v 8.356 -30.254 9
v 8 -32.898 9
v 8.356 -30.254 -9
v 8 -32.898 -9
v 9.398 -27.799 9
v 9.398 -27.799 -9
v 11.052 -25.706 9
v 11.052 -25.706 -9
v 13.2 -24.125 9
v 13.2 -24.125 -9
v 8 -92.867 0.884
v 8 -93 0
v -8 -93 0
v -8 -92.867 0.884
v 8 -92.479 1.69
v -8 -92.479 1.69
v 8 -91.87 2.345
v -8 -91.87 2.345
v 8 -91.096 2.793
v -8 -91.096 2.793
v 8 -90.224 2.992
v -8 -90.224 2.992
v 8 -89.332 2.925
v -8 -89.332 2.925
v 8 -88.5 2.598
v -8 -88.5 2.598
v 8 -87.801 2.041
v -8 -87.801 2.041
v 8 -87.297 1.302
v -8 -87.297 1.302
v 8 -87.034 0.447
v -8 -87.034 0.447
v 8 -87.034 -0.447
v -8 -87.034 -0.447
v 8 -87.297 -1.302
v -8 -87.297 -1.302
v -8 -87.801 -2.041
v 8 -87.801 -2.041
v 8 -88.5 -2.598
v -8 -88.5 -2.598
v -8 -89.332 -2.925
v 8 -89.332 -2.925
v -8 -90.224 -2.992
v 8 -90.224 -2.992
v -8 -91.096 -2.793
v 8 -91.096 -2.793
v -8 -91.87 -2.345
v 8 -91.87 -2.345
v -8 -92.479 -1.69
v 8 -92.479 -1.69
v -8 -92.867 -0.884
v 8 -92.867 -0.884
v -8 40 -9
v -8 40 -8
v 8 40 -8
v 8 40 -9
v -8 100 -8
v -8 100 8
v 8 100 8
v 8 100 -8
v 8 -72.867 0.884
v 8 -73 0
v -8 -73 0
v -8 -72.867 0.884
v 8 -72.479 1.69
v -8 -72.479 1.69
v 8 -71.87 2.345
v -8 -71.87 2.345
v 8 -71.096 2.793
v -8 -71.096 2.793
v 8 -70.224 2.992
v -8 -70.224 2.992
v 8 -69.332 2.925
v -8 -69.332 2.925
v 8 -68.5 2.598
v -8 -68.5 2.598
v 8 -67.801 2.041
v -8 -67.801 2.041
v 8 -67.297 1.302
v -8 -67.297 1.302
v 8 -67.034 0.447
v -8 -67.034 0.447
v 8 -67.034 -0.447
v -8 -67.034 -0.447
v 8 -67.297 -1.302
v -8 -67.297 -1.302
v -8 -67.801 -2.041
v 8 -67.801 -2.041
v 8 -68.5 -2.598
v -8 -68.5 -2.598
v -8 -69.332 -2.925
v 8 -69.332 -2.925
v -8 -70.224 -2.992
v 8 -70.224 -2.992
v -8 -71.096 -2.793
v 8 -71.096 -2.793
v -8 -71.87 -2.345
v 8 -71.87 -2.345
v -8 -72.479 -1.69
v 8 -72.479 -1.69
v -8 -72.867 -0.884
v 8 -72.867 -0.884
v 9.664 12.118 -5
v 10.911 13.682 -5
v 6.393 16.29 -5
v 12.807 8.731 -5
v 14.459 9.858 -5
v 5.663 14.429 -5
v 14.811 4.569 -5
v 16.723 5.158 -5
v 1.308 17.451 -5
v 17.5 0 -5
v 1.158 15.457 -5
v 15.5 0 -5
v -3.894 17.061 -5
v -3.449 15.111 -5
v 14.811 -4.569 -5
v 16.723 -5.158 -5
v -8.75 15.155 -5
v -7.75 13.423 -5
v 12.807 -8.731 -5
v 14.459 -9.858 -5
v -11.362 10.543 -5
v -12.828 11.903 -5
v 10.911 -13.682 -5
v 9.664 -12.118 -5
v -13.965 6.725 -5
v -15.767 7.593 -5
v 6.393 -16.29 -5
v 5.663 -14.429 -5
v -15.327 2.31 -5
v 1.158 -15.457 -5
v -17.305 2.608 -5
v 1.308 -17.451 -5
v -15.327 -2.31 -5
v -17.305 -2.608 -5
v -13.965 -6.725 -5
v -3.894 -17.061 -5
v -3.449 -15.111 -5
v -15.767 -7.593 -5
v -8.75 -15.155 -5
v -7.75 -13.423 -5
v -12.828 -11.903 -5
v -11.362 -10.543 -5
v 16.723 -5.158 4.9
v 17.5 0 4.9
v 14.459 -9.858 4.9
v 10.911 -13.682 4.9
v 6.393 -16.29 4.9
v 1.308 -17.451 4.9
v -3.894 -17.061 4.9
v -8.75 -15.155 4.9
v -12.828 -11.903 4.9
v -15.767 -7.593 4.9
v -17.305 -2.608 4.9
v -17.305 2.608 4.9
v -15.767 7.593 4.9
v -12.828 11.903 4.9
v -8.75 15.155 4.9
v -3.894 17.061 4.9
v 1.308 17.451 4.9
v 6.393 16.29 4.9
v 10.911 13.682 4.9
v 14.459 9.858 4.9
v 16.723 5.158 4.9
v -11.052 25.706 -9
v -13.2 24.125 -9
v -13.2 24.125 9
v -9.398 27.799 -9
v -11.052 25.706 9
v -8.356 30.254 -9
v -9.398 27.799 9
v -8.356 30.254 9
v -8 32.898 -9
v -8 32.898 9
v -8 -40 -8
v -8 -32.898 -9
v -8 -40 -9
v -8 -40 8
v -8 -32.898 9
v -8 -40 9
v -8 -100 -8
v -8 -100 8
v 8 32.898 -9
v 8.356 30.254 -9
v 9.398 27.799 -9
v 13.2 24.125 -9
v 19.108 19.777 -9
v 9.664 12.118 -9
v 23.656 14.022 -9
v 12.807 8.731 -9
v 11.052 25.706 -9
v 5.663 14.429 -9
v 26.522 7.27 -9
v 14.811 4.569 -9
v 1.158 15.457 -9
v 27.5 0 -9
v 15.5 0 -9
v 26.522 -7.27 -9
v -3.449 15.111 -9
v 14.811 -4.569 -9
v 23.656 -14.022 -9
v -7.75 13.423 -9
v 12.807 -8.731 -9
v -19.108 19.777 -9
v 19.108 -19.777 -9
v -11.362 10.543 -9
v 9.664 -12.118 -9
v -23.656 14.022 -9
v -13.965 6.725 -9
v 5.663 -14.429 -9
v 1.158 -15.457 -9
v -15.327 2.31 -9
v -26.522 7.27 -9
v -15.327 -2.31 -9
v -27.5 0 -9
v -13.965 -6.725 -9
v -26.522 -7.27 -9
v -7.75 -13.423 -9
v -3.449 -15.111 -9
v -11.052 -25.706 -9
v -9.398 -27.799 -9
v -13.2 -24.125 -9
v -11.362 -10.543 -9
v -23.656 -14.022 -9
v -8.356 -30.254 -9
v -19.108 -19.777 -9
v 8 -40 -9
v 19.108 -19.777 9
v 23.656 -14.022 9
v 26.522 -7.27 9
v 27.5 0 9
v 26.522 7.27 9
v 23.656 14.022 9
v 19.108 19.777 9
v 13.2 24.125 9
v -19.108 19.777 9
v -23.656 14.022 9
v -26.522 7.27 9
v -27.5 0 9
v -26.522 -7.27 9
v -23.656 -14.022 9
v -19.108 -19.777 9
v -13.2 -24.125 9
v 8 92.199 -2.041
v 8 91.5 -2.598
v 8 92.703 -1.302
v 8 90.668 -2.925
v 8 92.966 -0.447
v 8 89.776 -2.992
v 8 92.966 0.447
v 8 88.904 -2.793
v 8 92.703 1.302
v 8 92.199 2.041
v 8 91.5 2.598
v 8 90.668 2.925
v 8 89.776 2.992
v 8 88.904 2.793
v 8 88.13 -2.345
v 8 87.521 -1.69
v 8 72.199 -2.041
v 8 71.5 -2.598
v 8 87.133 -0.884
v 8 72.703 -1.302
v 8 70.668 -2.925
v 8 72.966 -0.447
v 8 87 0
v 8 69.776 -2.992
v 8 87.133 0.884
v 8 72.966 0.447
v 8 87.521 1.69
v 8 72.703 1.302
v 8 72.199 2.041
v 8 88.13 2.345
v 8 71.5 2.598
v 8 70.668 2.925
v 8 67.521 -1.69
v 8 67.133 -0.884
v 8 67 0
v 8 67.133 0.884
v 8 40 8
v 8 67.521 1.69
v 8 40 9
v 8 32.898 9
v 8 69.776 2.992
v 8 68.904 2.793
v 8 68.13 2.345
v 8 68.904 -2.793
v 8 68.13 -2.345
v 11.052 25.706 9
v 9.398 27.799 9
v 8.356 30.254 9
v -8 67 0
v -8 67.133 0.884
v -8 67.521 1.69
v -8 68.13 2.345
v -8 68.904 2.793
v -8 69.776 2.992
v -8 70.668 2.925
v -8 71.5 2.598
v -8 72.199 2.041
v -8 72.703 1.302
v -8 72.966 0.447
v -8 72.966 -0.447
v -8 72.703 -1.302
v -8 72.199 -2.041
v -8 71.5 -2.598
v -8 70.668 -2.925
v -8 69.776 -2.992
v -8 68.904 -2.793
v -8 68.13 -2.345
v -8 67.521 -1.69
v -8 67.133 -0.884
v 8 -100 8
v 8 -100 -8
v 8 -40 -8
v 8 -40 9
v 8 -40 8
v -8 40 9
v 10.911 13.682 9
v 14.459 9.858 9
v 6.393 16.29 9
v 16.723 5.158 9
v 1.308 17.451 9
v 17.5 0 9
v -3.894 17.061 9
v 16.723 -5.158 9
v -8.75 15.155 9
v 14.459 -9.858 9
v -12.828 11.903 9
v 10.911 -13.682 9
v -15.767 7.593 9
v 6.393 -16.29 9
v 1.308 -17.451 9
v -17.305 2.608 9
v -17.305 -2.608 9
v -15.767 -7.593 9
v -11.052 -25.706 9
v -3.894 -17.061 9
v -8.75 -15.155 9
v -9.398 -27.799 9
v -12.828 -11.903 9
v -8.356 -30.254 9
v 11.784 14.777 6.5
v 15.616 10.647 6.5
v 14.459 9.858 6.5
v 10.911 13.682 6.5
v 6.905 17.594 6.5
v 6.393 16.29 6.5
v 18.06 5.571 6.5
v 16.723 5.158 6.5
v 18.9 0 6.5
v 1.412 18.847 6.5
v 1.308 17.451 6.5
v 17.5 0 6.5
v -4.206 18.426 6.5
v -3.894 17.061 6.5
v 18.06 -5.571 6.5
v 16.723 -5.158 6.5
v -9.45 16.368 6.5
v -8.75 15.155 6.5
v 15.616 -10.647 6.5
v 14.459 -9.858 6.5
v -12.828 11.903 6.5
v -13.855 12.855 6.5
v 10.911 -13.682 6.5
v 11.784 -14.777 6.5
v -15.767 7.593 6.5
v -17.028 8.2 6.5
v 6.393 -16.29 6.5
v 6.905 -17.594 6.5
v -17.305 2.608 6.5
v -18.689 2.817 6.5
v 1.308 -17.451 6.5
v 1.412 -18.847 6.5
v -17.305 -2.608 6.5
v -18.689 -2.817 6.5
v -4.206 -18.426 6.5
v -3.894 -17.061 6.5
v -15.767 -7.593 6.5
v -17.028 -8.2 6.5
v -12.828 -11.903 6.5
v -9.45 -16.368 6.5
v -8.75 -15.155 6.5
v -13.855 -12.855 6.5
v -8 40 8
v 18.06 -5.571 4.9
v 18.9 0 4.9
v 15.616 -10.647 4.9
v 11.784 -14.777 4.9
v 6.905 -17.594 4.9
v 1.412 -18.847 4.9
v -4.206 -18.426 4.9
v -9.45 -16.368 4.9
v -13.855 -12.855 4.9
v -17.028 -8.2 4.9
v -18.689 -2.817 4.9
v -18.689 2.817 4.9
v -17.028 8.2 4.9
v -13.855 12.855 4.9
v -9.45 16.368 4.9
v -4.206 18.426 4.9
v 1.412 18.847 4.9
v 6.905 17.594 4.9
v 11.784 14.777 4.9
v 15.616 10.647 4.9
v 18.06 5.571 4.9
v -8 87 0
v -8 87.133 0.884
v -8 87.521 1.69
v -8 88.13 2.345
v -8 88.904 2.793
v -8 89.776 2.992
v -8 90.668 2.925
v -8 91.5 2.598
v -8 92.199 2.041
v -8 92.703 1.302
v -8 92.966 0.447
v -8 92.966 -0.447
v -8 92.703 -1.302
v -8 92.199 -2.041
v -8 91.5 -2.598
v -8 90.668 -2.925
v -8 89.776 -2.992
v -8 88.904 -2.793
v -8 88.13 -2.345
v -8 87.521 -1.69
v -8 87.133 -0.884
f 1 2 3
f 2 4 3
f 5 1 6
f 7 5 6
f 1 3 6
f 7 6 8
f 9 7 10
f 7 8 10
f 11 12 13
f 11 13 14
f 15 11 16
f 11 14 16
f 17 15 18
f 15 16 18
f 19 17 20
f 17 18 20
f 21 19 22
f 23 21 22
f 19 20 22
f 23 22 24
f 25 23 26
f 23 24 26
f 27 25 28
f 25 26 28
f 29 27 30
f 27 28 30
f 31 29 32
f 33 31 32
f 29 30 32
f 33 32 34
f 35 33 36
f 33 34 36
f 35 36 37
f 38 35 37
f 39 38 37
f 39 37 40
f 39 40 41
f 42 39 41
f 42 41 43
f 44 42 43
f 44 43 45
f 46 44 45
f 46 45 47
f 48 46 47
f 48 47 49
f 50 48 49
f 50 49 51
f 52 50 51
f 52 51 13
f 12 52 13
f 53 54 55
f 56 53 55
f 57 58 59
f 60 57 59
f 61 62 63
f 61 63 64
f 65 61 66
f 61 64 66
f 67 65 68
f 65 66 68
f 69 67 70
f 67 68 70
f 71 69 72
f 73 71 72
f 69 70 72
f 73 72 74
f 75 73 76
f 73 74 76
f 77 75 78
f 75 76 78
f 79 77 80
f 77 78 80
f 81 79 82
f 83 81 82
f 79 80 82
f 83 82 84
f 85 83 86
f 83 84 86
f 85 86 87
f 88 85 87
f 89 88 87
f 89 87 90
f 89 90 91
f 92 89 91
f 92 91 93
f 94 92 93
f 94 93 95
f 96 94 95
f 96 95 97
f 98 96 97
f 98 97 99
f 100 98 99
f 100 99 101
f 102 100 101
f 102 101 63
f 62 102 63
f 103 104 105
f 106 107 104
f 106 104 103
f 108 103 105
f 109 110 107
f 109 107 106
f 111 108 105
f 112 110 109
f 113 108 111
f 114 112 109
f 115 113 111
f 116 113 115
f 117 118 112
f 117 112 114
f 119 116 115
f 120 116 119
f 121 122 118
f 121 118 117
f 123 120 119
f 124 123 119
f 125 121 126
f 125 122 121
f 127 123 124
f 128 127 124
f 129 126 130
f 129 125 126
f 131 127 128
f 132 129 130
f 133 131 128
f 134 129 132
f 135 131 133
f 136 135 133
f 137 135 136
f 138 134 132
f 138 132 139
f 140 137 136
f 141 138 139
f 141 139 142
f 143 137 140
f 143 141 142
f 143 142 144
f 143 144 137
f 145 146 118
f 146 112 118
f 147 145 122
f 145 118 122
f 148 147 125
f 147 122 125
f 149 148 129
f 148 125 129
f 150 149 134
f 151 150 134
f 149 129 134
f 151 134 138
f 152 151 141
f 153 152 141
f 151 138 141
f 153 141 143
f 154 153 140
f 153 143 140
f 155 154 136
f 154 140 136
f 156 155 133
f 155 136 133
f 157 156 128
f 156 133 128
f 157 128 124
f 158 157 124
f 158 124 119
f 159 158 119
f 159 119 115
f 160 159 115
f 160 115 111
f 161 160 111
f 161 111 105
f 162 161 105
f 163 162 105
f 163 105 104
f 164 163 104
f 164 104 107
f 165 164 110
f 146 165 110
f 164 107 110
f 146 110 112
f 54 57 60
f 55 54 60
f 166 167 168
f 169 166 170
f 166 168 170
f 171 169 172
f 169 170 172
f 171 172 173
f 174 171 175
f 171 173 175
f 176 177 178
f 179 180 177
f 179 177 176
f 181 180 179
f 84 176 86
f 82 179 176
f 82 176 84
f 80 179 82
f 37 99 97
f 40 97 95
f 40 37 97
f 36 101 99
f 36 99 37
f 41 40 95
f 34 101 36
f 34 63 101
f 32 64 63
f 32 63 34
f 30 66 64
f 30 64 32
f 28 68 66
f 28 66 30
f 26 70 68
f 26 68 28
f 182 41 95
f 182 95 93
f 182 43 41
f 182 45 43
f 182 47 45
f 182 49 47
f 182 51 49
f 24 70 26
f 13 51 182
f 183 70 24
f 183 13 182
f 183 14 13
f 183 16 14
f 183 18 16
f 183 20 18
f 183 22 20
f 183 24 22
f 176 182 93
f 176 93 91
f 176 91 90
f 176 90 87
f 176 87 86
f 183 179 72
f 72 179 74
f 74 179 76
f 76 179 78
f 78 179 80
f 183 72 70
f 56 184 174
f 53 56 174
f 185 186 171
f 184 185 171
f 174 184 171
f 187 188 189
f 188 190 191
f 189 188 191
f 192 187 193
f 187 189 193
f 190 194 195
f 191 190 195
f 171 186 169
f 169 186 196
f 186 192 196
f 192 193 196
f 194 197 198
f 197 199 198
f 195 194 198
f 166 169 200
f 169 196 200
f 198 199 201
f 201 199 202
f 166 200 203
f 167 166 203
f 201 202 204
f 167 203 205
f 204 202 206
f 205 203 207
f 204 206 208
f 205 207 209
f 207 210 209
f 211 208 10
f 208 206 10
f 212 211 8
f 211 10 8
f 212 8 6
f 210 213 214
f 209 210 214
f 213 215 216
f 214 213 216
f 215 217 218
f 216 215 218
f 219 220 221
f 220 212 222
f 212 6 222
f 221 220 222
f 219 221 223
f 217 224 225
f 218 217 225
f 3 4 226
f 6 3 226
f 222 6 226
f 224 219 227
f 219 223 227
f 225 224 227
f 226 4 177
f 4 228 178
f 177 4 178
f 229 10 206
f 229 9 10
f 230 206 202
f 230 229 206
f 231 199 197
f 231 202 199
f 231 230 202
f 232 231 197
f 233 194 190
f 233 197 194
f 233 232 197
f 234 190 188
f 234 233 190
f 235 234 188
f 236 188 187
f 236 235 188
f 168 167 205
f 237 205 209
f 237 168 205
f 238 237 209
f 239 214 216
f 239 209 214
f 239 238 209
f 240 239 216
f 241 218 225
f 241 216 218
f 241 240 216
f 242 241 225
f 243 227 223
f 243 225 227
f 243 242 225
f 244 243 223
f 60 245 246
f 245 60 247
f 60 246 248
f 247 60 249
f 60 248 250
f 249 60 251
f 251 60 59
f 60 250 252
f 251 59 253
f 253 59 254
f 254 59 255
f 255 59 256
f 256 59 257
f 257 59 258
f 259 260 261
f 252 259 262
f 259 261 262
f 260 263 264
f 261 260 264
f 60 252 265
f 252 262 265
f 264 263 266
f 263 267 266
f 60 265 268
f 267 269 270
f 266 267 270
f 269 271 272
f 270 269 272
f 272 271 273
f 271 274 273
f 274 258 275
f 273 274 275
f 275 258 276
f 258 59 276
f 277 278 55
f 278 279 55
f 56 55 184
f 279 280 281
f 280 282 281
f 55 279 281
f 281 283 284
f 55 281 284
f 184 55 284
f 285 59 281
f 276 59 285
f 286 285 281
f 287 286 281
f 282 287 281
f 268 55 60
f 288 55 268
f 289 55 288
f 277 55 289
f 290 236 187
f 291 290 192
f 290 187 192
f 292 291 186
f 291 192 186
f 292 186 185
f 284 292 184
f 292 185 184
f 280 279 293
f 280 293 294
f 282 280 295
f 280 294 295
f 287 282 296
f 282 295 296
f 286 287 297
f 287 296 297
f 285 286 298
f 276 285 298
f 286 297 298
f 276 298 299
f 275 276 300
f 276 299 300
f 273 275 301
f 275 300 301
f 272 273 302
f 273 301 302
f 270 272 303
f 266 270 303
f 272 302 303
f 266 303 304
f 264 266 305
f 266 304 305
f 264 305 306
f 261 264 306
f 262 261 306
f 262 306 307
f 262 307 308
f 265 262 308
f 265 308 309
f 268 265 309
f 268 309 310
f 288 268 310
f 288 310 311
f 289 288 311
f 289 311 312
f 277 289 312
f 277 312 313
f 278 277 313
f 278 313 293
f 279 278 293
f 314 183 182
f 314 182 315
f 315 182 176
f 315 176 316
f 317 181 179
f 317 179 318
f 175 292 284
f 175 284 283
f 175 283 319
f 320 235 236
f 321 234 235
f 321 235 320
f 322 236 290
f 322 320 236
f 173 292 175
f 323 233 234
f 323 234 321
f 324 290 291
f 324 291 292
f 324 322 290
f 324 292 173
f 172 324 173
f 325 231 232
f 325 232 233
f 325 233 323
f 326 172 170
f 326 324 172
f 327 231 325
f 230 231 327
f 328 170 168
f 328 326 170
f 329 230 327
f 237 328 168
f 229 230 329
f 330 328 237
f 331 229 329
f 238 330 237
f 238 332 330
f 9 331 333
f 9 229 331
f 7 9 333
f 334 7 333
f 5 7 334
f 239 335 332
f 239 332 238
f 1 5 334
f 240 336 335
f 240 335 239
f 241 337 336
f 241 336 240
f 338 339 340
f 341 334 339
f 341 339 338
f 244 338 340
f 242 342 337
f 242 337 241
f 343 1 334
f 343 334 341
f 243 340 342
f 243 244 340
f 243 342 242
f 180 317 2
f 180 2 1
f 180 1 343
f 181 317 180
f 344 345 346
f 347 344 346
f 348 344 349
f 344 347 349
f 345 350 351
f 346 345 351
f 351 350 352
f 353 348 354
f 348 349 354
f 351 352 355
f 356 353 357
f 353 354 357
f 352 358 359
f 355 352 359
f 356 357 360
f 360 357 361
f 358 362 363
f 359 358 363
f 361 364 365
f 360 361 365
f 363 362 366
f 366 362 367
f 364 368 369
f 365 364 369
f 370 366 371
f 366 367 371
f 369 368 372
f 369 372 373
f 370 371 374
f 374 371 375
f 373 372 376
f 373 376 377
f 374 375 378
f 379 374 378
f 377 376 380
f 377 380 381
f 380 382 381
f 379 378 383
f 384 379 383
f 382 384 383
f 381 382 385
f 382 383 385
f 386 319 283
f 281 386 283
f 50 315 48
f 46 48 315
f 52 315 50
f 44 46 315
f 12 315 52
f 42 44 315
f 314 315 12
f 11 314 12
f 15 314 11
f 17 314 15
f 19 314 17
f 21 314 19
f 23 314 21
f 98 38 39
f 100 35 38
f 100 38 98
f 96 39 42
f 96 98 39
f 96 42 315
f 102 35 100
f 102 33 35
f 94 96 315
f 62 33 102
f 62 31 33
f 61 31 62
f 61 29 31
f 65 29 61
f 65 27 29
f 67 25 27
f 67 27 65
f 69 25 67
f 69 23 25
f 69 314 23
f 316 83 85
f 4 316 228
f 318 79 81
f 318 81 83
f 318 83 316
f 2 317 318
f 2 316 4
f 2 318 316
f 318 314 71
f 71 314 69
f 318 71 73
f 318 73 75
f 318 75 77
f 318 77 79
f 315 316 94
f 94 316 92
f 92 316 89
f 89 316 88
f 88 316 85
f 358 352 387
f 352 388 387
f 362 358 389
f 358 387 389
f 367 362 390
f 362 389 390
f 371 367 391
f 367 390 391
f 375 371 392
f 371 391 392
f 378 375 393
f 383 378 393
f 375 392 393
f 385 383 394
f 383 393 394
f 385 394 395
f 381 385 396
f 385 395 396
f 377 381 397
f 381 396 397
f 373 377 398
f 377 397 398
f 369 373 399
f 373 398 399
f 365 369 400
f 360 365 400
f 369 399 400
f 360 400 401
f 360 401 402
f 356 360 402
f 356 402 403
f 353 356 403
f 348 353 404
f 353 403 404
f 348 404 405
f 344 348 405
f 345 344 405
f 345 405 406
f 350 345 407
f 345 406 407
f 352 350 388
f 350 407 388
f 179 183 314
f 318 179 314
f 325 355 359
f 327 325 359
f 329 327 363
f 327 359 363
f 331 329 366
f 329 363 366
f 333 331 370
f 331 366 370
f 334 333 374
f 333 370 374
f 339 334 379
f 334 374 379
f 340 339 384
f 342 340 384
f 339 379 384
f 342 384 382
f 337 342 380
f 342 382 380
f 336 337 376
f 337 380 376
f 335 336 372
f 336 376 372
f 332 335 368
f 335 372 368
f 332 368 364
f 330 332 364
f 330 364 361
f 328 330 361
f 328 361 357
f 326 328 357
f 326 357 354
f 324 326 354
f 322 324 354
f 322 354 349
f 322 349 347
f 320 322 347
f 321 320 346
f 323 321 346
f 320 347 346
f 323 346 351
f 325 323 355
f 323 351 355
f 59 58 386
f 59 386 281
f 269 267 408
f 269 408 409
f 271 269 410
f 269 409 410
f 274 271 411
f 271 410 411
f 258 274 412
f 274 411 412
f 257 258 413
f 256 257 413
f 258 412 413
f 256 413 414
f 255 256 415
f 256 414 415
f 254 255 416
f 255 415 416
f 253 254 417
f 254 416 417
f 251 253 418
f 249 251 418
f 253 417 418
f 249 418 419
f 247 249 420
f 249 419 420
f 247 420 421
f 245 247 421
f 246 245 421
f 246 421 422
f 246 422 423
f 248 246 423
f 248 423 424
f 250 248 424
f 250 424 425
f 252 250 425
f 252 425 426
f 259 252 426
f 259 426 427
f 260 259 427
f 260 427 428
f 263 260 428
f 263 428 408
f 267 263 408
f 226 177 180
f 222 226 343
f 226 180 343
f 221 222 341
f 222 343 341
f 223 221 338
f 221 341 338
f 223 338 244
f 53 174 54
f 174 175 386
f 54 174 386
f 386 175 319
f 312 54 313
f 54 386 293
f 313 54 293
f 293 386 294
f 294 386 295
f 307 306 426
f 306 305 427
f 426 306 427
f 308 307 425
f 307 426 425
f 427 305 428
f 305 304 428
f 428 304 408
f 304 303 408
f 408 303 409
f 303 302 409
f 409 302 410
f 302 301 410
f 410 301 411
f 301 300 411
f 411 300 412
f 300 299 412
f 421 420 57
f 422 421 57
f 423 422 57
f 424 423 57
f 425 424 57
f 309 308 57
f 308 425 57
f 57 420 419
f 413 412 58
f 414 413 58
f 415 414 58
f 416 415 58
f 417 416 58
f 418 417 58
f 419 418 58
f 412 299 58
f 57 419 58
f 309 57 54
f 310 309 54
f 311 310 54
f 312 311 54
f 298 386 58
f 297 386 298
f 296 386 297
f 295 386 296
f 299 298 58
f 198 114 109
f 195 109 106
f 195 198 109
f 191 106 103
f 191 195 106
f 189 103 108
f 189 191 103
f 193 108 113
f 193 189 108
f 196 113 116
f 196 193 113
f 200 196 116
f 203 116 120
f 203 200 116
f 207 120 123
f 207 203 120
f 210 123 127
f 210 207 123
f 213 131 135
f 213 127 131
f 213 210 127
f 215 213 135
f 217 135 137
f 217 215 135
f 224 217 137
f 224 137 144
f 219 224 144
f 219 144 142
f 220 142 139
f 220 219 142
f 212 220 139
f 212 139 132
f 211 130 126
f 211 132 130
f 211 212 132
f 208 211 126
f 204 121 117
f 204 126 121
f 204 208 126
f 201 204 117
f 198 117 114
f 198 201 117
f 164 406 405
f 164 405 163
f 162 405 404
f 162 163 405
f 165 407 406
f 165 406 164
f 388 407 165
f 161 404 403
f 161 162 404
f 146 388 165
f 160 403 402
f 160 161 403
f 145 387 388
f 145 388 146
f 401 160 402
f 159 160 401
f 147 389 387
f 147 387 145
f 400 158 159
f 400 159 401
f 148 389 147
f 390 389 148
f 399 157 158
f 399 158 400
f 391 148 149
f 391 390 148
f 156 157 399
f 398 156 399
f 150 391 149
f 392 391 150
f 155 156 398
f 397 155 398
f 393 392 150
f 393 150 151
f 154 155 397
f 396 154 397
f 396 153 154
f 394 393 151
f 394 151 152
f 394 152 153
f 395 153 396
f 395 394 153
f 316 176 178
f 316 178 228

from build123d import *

# Parameters (mm, degrees)
SKETCH1_R           = 27.5
SKETCH1_R_2         = 15.5
BOSS_EXTRUDE1_DEPTH = 9
BOSS_EXTRUDE2_DEPTH = 9
SKETCH3_W           = 14
SKETCH3_H           = 2
SKETCH4_W           = 1.6
SKETCH4_H           = 1.9
FILLET1_R           = 10
SKETCH5_W           = 16
SKETCH5_H           = 1
CUT_EXTRUDE1_DEPTH  = 60
SKETCH6_R           = 3
CUT_EXTRUDE2_DEPTH  = 107.495305061
SKETCH7_R           = 3
CUT_EXTRUDE3_DEPTH  = 107.495305061


with BuildPart() as part:
    # Sketch1 → Boss-Extrude1 (new, symmetric)
    with BuildSketch(Plane.XY):
        Circle(SKETCH1_R)
        Circle(SKETCH1_R_2, mode=Mode.SUBTRACT)
    extrude(amount=BOSS_EXTRUDE1_DEPTH, both=True)

    # Sketch2 → Boss-Extrude2 (add, symmetric)
    with BuildSketch(Plane.XY):
        Polygon((-8, 100), (8, 100), (8, 26.310644234), (0, 27.5), (-8, 26.310644234), align=None)
    boss_extrude2 = extrude(amount=BOSS_EXTRUDE2_DEPTH, both=True)

    # Mirror1: Boss-Extrude2 across plane
    add(boss_extrude2.mirror(Plane.ZX))

    # Sketch3 → Cut-Revolve1 (revolve, cut)
    with BuildSketch(Plane(origin=(0, 0, 0), x_dir=(0, 0, -1), z_dir=(1, 0, 0)), mode=Mode.PRIVATE) as cut_revolve1_sk:
        with Locations((-2, 16.5)):
            Rectangle(SKETCH3_W, SKETCH3_H)
    revolve(cut_revolve1_sk.sketch.rotate(Axis((0, 0, 0), (0, 0, -1)), 90), axis=Axis((0, 0, 0), (0, 0, -1)), mode=Mode.SUBTRACT)

    # Sketch4 → Cut-Revolve2 (revolve, cut)
    with BuildSketch(Plane(origin=(0, 0, 0), x_dir=(0, 0, -1), z_dir=(1, 0, 0)), mode=Mode.PRIVATE) as cut_revolve2_sk:
        with Locations((-5.7, 17.95)):
            Rectangle(SKETCH4_W, SKETCH4_H)
    revolve(cut_revolve2_sk.sketch.rotate(Axis((0, 0, 0), (0, 0, -1)), 90), axis=Axis((0, 0, 0), (0, 0, -1)), mode=Mode.SUBTRACT)

    # Fillet1
    fillet1_edges = [part.edges().sort_by_distance(p)[0] for p in [
        (8, 26.310644234, 0),
        (-8, 26.310644234, 0),
        (8, -26.310644234, 0),
        (-8, -26.310644234, 0),
    ]]
    fillet(fillet1_edges, radius=FILLET1_R)

    # Sketch5 → Cut-Extrude1 (cut)
    with BuildSketch(Plane.XZ.offset(100)):
        with Locations((0, 8.5)):
            Rectangle(SKETCH5_W, SKETCH5_H)
        with Locations((0, -8.5)):
            Rectangle(SKETCH5_W, SKETCH5_H)
    cut_extrude1 = extrude(amount=-CUT_EXTRUDE1_DEPTH, mode=Mode.SUBTRACT)

    # Sketch6 → Cut-Extrude2 (cut, through all)
    with BuildSketch(Plane.ZY.offset(8)):
        with Locations(Location((0, 90, 0), (0, 0, 270))):
            Circle(SKETCH6_R)
        with Locations(Location((0, 70, 0), (0, 0, 270))):
            Circle(SKETCH6_R)
    extrude(amount=-CUT_EXTRUDE2_DEPTH, mode=Mode.SUBTRACT)

    # Sketch7 → Cut-Extrude3 (cut, through all)
    with BuildSketch(Plane.ZY.offset(8)):
        with Locations(Location((0, -90, 0), (0, 0, 270))):
            Circle(SKETCH7_R)
        with Locations(Location((0, -70, 0), (0, 0, 270))):
            Circle(SKETCH7_R)
    extrude(amount=-CUT_EXTRUDE3_DEPTH, mode=Mode.SUBTRACT)

    # Mirror2: Cut-Extrude1 across plane
    add(cut_extrude1.mirror(Plane.ZX), mode=Mode.SUBTRACT)


solid = part.part
